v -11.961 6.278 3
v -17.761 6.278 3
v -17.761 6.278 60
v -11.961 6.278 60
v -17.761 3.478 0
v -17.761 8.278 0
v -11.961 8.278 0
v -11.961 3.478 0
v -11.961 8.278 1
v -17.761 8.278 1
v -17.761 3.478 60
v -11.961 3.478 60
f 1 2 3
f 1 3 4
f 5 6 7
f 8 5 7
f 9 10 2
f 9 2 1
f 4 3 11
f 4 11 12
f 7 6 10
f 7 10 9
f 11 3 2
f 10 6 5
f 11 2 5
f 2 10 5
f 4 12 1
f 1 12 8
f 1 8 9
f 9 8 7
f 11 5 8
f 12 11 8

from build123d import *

# Parameters (mm, degrees)
F0_W     = 5.8
F0_H     = 2
F0_H_2   = 2.8
F1_DEPTH = 3
F2_DEPTH = 60
F3_SIZE  = 1.99999


# Not quite as in the source:
# - a fillet or chamfer is up to 0.001 mm smaller than in the source, because OpenCascade refuses the exact size
# - a feature names something its author has since deleted; it is built from what else it names


with BuildPart() as f1:
    # F0 (on Top) → F1 (new body)
    with BuildSketch(Plane.XY):
        with Locations((-14.8613960065, 7.2783571027)):
            Rectangle(F0_W, F0_H)
        with Locations((-14.8613960065, 4.8783571027)):
            Rectangle(F0_W, F0_H_2)
    extrude(amount=F1_DEPTH)

    # F0 (on Top) → F2 (join)
    with BuildSketch(Plane.XY):
        with Locations((-14.8613960065, 4.8783571027)):
            Rectangle(F0_W, F0_H_2)
    extrude(amount=F2_DEPTH)

    # F3 (size 2 in the source; OpenCascade refuses exactly that, so slightly less here)
    f3_edges = [f1.edges().sort_by_distance(p)[0] for p in [
        (-14.861396, 8.278357, 3),
    ]]
    chamfer(f3_edges, length=F3_SIZE)


solid = f1.part
